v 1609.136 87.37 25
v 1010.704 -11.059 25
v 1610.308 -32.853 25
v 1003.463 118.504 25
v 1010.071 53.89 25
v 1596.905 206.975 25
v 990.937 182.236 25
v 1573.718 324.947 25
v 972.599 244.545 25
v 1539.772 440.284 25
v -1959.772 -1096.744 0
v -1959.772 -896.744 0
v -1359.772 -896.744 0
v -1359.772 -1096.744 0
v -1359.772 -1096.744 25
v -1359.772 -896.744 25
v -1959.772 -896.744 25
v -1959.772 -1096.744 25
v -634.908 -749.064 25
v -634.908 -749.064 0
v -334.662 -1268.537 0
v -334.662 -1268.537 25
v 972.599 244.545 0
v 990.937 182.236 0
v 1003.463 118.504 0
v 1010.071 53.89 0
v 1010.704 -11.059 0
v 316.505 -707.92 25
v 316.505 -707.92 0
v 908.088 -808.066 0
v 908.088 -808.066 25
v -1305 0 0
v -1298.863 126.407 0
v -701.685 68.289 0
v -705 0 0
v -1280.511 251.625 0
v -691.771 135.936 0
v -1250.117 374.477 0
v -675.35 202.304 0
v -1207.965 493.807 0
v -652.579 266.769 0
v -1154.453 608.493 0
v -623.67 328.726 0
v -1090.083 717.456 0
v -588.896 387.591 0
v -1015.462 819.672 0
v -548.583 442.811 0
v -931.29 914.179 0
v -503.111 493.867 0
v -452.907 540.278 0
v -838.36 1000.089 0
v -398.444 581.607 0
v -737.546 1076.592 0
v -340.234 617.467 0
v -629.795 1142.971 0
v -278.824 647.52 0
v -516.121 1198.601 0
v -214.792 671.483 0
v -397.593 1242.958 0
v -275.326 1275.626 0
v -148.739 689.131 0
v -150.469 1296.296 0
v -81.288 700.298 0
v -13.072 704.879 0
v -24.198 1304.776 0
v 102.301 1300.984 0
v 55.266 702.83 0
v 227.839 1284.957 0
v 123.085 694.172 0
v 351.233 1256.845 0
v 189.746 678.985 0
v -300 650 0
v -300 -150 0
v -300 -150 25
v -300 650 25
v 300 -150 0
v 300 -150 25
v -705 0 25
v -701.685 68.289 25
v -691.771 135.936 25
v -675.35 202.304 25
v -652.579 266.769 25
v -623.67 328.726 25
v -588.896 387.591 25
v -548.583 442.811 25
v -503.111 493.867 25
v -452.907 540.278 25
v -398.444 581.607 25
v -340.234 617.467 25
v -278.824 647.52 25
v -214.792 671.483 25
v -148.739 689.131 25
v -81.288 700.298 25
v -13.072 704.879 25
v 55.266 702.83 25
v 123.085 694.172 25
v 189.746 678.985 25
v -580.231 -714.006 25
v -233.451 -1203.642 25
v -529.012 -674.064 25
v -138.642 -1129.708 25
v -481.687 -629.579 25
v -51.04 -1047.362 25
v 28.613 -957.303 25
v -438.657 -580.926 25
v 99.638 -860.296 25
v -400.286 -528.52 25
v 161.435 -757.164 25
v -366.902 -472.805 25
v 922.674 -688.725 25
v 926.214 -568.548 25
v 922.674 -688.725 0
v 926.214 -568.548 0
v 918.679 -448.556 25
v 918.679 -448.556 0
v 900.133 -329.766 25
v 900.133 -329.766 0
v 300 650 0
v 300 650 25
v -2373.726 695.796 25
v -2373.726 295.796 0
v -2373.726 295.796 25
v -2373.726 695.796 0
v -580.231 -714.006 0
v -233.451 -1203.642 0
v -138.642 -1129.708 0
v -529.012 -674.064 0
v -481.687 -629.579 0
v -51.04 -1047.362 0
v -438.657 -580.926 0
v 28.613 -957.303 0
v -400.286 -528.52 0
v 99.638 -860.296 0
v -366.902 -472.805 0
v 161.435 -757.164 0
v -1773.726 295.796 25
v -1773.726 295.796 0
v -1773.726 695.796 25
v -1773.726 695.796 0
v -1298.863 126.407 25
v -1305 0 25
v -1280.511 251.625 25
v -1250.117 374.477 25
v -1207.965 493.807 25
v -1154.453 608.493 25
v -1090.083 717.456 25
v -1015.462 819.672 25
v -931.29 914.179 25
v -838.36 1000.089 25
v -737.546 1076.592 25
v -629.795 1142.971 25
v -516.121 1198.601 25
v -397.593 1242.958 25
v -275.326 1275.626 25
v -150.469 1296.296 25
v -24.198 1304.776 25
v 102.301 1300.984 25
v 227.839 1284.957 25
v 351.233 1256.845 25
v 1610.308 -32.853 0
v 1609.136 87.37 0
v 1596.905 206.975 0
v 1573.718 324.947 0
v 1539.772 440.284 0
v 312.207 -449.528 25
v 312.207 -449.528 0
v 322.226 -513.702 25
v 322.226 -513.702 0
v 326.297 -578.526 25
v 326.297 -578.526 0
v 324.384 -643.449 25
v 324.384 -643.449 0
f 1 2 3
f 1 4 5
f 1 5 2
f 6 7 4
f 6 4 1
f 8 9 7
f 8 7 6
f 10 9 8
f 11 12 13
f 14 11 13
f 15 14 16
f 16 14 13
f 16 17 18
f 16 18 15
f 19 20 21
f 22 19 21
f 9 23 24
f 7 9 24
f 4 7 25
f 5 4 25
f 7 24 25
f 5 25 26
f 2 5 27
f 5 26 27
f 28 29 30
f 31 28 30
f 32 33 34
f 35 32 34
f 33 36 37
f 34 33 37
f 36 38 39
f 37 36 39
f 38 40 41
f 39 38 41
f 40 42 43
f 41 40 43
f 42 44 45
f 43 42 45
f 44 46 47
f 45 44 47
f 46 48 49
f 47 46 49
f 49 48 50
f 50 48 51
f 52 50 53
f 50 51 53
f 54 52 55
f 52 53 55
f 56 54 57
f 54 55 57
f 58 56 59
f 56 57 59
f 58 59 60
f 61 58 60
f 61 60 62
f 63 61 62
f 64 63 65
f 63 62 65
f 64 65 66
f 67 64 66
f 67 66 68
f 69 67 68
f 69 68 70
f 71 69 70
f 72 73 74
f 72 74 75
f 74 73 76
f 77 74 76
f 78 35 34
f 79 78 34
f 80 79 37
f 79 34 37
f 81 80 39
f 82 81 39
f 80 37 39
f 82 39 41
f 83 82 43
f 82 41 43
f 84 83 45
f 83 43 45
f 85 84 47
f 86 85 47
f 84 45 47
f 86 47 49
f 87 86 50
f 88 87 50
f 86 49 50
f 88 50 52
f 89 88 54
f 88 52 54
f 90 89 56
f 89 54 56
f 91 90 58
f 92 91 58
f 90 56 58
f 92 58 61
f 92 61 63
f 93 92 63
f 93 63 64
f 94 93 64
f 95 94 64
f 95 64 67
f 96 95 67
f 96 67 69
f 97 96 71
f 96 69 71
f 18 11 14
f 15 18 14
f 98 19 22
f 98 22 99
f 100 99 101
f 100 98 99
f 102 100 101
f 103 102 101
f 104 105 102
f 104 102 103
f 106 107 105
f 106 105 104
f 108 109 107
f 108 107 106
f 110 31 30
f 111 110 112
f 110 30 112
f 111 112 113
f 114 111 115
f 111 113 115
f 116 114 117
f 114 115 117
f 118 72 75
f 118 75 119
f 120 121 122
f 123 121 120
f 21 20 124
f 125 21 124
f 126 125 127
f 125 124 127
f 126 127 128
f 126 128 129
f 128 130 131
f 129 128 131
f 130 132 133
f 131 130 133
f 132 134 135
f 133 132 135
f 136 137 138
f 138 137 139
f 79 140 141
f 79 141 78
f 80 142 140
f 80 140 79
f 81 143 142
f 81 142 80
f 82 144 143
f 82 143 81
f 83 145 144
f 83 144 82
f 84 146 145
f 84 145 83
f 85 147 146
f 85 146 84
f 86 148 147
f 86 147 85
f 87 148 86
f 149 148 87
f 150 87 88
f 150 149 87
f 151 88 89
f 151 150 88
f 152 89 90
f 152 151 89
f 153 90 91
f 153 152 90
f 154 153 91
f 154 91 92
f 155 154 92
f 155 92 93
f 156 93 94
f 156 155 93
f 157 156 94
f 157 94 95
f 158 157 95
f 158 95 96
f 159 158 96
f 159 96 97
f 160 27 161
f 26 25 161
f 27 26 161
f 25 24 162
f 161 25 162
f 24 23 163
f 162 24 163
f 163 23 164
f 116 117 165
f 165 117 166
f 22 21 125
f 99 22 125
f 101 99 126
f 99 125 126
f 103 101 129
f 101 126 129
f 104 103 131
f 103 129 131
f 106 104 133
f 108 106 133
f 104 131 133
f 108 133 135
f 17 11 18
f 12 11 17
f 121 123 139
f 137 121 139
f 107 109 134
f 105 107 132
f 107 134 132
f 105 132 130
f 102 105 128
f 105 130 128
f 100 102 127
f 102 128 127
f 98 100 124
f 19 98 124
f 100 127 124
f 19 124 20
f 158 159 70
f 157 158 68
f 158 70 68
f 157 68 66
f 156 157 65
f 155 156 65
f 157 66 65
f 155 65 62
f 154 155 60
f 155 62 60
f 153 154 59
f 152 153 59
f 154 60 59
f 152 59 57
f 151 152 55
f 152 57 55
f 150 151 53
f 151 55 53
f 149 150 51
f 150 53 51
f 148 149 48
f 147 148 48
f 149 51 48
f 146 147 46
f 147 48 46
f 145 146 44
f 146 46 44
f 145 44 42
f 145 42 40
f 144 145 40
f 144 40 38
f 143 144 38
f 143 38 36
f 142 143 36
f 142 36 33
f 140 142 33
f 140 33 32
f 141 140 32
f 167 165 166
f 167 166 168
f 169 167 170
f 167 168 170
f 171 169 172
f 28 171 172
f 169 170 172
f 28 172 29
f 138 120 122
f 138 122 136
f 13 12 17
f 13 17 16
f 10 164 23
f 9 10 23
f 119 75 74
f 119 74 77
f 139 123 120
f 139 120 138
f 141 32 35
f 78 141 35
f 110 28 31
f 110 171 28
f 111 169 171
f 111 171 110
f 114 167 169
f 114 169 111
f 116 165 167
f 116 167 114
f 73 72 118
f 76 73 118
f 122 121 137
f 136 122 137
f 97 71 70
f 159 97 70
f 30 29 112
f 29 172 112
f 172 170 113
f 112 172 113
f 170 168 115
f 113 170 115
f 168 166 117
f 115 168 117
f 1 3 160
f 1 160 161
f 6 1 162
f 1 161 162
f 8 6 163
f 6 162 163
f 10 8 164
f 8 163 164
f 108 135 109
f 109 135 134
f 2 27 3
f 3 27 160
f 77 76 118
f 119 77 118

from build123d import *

# Parameters (mm, degrees)
F1_DEPTH  = 25
F2_W      = 600
F2_H      = 400
F3_DEPTH  = 25
F5_DEPTH  = 25
F6_W      = 600
F6_H      = 800
F7_DEPTH  = 25
F8_W      = 600
F8_H      = 200
F9_DEPTH  = 25
F11_DEPTH = 25
F13_DEPTH = 25


with BuildPart() as f1:
    # F0 (on Top) → F1 (new body)
    with BuildSketch(Plane.XY):
        with BuildLine():
            Line((189.746486, 678.985472), (351.232857, 1256.845448))
            ThreePointArc((351.232857, 1256.845448), (-788.880892, 1039.563341), (-1305, 0))
            Line((-1305, 0), (-705, 0))
            ThreePointArc((-705, 0), (-426.177033, 561.603184), (189.746486, 678.985472))
        make_face()
    extrude(amount=F1_DEPTH)


with BuildPart() as f3:
    # F2 (on Top) → F3 (new body)
    with BuildSketch(Plane.XY):
        with Locations((-2073.726237, 495.7957)):
            Rectangle(F2_W, F2_H)
    extrude(amount=F3_DEPTH)


with BuildPart() as f5:
    # F4 (on Top) → F5 (new body)
    with BuildSketch(Plane.XY):
        with BuildLine():
            Line((1010.704266, -11.058548), (1610.308291, -32.853329))
            ThreePointArc((1610.308291, -32.853329), (1596.904862, 206.975152), (1539.772181, 440.284409))
            Line((1539.772181, 440.284409), (972.598551, 244.544598))
            ThreePointArc((972.598551, 244.544598), (1003.463333, 118.503965), (1010.704266, -11.058548))
        make_face()
    extrude(amount=F5_DEPTH)


with BuildPart() as f7:
    # F6 (on Top) → F7 (new body)
    with BuildSketch(Plane.XY):
        with Locations((0, 250)):
            Rectangle(F6_W, F6_H)
    extrude(amount=F7_DEPTH)


with BuildPart() as f9:
    # F8 (on Top) → F9 (new body)
    with BuildSketch(Plane.XY):
        with Locations((-1659.771848, -996.74437)):
            Rectangle(F8_W, F8_H)
    extrude(amount=F9_DEPTH)


with BuildPart() as f11:
    # F10 (on Top) → F11 (new body)
    with BuildSketch(Plane.XY):
        with BuildLine():
            Line((316.504749, -707.92033), (908.088075, -808.066066))
            ThreePointArc((908.088075, -808.066066), (926.213896, -568.548202), (900.133299, -329.76555))
            Line((900.133299, -329.76555), (312.207341, -449.528098))
            ThreePointArc((312.207341, -449.528098), (326.296859, -578.525623), (316.504749, -707.92033))
        make_face()
    extrude(amount=F11_DEPTH)


with BuildPart() as f13:
    # F12 (on Top) → F13 (new body)
    with BuildSketch(Plane.XY):
        with BuildLine():
            Line((-634.908229, -749.064059), (-334.661729, -1268.536906))
            ThreePointArc((-334.661729, -1268.536906), (-51.039558, -1047.361741), (161.435032, -757.164329))
            Line((161.435032, -757.164329), (-366.901933, -472.80531))
            ThreePointArc((-366.901933, -472.80531), (-481.687056, -629.578625), (-634.908229, -749.064059))
        make_face()
    extrude(amount=F13_DEPTH)


solid = Compound([f1.part, f3.part, f5.part, f7.part, f9.part, f11.part, f13.part])
